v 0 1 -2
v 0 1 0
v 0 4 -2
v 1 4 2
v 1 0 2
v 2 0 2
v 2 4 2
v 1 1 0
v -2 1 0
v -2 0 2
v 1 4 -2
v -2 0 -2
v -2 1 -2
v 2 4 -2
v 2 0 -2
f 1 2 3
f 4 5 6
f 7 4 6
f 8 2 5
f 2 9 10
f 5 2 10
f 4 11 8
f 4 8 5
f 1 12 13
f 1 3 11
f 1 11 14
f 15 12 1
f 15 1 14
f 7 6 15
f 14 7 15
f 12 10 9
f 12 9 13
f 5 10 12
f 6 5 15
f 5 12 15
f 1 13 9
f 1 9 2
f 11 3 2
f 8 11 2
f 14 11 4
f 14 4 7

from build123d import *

# Parameters (mm, degrees)
SKETCH1_W           = 4
SKETCH1_H           = 4
BOSS_EXTRUDE1_DEPTH = 4
CUT_EXTRUDE1_DEPTH  = 3
SKETCH3_W           = 2
SKETCH3_H           = 2
CUT_EXTRUDE2_DEPTH  = 3


with BuildPart() as part:
    # Sketch1 → Boss-Extrude1 (new body)
    with BuildSketch(Plane(origin=(0, 0, 0), x_dir=(1, 0, 0), z_dir=(0, 1, 0))):
        Rectangle(SKETCH1_W, SKETCH1_H)
    extrude(amount=BOSS_EXTRUDE1_DEPTH)

    # Sketch2 → Cut-Extrude1 (cut)
    with BuildSketch(Plane.ZY.offset(2)):
        Polygon((-2, 4), (0, 1), (2, 0), (2, 4), align=None)
    extrude(amount=-CUT_EXTRUDE1_DEPTH, mode=Mode.SUBTRACT)

    # Sketch3 → Cut-Extrude2 (cut)
    with BuildSketch(Plane(origin=(0, 4, 0), x_dir=(1, 0, 0), z_dir=(0, 1, 0))):
        with Locations((-1, 1)):
            Rectangle(SKETCH3_W, SKETCH3_H)
    extrude(amount=-CUT_EXTRUDE2_DEPTH, mode=Mode.SUBTRACT)


solid = part.part
